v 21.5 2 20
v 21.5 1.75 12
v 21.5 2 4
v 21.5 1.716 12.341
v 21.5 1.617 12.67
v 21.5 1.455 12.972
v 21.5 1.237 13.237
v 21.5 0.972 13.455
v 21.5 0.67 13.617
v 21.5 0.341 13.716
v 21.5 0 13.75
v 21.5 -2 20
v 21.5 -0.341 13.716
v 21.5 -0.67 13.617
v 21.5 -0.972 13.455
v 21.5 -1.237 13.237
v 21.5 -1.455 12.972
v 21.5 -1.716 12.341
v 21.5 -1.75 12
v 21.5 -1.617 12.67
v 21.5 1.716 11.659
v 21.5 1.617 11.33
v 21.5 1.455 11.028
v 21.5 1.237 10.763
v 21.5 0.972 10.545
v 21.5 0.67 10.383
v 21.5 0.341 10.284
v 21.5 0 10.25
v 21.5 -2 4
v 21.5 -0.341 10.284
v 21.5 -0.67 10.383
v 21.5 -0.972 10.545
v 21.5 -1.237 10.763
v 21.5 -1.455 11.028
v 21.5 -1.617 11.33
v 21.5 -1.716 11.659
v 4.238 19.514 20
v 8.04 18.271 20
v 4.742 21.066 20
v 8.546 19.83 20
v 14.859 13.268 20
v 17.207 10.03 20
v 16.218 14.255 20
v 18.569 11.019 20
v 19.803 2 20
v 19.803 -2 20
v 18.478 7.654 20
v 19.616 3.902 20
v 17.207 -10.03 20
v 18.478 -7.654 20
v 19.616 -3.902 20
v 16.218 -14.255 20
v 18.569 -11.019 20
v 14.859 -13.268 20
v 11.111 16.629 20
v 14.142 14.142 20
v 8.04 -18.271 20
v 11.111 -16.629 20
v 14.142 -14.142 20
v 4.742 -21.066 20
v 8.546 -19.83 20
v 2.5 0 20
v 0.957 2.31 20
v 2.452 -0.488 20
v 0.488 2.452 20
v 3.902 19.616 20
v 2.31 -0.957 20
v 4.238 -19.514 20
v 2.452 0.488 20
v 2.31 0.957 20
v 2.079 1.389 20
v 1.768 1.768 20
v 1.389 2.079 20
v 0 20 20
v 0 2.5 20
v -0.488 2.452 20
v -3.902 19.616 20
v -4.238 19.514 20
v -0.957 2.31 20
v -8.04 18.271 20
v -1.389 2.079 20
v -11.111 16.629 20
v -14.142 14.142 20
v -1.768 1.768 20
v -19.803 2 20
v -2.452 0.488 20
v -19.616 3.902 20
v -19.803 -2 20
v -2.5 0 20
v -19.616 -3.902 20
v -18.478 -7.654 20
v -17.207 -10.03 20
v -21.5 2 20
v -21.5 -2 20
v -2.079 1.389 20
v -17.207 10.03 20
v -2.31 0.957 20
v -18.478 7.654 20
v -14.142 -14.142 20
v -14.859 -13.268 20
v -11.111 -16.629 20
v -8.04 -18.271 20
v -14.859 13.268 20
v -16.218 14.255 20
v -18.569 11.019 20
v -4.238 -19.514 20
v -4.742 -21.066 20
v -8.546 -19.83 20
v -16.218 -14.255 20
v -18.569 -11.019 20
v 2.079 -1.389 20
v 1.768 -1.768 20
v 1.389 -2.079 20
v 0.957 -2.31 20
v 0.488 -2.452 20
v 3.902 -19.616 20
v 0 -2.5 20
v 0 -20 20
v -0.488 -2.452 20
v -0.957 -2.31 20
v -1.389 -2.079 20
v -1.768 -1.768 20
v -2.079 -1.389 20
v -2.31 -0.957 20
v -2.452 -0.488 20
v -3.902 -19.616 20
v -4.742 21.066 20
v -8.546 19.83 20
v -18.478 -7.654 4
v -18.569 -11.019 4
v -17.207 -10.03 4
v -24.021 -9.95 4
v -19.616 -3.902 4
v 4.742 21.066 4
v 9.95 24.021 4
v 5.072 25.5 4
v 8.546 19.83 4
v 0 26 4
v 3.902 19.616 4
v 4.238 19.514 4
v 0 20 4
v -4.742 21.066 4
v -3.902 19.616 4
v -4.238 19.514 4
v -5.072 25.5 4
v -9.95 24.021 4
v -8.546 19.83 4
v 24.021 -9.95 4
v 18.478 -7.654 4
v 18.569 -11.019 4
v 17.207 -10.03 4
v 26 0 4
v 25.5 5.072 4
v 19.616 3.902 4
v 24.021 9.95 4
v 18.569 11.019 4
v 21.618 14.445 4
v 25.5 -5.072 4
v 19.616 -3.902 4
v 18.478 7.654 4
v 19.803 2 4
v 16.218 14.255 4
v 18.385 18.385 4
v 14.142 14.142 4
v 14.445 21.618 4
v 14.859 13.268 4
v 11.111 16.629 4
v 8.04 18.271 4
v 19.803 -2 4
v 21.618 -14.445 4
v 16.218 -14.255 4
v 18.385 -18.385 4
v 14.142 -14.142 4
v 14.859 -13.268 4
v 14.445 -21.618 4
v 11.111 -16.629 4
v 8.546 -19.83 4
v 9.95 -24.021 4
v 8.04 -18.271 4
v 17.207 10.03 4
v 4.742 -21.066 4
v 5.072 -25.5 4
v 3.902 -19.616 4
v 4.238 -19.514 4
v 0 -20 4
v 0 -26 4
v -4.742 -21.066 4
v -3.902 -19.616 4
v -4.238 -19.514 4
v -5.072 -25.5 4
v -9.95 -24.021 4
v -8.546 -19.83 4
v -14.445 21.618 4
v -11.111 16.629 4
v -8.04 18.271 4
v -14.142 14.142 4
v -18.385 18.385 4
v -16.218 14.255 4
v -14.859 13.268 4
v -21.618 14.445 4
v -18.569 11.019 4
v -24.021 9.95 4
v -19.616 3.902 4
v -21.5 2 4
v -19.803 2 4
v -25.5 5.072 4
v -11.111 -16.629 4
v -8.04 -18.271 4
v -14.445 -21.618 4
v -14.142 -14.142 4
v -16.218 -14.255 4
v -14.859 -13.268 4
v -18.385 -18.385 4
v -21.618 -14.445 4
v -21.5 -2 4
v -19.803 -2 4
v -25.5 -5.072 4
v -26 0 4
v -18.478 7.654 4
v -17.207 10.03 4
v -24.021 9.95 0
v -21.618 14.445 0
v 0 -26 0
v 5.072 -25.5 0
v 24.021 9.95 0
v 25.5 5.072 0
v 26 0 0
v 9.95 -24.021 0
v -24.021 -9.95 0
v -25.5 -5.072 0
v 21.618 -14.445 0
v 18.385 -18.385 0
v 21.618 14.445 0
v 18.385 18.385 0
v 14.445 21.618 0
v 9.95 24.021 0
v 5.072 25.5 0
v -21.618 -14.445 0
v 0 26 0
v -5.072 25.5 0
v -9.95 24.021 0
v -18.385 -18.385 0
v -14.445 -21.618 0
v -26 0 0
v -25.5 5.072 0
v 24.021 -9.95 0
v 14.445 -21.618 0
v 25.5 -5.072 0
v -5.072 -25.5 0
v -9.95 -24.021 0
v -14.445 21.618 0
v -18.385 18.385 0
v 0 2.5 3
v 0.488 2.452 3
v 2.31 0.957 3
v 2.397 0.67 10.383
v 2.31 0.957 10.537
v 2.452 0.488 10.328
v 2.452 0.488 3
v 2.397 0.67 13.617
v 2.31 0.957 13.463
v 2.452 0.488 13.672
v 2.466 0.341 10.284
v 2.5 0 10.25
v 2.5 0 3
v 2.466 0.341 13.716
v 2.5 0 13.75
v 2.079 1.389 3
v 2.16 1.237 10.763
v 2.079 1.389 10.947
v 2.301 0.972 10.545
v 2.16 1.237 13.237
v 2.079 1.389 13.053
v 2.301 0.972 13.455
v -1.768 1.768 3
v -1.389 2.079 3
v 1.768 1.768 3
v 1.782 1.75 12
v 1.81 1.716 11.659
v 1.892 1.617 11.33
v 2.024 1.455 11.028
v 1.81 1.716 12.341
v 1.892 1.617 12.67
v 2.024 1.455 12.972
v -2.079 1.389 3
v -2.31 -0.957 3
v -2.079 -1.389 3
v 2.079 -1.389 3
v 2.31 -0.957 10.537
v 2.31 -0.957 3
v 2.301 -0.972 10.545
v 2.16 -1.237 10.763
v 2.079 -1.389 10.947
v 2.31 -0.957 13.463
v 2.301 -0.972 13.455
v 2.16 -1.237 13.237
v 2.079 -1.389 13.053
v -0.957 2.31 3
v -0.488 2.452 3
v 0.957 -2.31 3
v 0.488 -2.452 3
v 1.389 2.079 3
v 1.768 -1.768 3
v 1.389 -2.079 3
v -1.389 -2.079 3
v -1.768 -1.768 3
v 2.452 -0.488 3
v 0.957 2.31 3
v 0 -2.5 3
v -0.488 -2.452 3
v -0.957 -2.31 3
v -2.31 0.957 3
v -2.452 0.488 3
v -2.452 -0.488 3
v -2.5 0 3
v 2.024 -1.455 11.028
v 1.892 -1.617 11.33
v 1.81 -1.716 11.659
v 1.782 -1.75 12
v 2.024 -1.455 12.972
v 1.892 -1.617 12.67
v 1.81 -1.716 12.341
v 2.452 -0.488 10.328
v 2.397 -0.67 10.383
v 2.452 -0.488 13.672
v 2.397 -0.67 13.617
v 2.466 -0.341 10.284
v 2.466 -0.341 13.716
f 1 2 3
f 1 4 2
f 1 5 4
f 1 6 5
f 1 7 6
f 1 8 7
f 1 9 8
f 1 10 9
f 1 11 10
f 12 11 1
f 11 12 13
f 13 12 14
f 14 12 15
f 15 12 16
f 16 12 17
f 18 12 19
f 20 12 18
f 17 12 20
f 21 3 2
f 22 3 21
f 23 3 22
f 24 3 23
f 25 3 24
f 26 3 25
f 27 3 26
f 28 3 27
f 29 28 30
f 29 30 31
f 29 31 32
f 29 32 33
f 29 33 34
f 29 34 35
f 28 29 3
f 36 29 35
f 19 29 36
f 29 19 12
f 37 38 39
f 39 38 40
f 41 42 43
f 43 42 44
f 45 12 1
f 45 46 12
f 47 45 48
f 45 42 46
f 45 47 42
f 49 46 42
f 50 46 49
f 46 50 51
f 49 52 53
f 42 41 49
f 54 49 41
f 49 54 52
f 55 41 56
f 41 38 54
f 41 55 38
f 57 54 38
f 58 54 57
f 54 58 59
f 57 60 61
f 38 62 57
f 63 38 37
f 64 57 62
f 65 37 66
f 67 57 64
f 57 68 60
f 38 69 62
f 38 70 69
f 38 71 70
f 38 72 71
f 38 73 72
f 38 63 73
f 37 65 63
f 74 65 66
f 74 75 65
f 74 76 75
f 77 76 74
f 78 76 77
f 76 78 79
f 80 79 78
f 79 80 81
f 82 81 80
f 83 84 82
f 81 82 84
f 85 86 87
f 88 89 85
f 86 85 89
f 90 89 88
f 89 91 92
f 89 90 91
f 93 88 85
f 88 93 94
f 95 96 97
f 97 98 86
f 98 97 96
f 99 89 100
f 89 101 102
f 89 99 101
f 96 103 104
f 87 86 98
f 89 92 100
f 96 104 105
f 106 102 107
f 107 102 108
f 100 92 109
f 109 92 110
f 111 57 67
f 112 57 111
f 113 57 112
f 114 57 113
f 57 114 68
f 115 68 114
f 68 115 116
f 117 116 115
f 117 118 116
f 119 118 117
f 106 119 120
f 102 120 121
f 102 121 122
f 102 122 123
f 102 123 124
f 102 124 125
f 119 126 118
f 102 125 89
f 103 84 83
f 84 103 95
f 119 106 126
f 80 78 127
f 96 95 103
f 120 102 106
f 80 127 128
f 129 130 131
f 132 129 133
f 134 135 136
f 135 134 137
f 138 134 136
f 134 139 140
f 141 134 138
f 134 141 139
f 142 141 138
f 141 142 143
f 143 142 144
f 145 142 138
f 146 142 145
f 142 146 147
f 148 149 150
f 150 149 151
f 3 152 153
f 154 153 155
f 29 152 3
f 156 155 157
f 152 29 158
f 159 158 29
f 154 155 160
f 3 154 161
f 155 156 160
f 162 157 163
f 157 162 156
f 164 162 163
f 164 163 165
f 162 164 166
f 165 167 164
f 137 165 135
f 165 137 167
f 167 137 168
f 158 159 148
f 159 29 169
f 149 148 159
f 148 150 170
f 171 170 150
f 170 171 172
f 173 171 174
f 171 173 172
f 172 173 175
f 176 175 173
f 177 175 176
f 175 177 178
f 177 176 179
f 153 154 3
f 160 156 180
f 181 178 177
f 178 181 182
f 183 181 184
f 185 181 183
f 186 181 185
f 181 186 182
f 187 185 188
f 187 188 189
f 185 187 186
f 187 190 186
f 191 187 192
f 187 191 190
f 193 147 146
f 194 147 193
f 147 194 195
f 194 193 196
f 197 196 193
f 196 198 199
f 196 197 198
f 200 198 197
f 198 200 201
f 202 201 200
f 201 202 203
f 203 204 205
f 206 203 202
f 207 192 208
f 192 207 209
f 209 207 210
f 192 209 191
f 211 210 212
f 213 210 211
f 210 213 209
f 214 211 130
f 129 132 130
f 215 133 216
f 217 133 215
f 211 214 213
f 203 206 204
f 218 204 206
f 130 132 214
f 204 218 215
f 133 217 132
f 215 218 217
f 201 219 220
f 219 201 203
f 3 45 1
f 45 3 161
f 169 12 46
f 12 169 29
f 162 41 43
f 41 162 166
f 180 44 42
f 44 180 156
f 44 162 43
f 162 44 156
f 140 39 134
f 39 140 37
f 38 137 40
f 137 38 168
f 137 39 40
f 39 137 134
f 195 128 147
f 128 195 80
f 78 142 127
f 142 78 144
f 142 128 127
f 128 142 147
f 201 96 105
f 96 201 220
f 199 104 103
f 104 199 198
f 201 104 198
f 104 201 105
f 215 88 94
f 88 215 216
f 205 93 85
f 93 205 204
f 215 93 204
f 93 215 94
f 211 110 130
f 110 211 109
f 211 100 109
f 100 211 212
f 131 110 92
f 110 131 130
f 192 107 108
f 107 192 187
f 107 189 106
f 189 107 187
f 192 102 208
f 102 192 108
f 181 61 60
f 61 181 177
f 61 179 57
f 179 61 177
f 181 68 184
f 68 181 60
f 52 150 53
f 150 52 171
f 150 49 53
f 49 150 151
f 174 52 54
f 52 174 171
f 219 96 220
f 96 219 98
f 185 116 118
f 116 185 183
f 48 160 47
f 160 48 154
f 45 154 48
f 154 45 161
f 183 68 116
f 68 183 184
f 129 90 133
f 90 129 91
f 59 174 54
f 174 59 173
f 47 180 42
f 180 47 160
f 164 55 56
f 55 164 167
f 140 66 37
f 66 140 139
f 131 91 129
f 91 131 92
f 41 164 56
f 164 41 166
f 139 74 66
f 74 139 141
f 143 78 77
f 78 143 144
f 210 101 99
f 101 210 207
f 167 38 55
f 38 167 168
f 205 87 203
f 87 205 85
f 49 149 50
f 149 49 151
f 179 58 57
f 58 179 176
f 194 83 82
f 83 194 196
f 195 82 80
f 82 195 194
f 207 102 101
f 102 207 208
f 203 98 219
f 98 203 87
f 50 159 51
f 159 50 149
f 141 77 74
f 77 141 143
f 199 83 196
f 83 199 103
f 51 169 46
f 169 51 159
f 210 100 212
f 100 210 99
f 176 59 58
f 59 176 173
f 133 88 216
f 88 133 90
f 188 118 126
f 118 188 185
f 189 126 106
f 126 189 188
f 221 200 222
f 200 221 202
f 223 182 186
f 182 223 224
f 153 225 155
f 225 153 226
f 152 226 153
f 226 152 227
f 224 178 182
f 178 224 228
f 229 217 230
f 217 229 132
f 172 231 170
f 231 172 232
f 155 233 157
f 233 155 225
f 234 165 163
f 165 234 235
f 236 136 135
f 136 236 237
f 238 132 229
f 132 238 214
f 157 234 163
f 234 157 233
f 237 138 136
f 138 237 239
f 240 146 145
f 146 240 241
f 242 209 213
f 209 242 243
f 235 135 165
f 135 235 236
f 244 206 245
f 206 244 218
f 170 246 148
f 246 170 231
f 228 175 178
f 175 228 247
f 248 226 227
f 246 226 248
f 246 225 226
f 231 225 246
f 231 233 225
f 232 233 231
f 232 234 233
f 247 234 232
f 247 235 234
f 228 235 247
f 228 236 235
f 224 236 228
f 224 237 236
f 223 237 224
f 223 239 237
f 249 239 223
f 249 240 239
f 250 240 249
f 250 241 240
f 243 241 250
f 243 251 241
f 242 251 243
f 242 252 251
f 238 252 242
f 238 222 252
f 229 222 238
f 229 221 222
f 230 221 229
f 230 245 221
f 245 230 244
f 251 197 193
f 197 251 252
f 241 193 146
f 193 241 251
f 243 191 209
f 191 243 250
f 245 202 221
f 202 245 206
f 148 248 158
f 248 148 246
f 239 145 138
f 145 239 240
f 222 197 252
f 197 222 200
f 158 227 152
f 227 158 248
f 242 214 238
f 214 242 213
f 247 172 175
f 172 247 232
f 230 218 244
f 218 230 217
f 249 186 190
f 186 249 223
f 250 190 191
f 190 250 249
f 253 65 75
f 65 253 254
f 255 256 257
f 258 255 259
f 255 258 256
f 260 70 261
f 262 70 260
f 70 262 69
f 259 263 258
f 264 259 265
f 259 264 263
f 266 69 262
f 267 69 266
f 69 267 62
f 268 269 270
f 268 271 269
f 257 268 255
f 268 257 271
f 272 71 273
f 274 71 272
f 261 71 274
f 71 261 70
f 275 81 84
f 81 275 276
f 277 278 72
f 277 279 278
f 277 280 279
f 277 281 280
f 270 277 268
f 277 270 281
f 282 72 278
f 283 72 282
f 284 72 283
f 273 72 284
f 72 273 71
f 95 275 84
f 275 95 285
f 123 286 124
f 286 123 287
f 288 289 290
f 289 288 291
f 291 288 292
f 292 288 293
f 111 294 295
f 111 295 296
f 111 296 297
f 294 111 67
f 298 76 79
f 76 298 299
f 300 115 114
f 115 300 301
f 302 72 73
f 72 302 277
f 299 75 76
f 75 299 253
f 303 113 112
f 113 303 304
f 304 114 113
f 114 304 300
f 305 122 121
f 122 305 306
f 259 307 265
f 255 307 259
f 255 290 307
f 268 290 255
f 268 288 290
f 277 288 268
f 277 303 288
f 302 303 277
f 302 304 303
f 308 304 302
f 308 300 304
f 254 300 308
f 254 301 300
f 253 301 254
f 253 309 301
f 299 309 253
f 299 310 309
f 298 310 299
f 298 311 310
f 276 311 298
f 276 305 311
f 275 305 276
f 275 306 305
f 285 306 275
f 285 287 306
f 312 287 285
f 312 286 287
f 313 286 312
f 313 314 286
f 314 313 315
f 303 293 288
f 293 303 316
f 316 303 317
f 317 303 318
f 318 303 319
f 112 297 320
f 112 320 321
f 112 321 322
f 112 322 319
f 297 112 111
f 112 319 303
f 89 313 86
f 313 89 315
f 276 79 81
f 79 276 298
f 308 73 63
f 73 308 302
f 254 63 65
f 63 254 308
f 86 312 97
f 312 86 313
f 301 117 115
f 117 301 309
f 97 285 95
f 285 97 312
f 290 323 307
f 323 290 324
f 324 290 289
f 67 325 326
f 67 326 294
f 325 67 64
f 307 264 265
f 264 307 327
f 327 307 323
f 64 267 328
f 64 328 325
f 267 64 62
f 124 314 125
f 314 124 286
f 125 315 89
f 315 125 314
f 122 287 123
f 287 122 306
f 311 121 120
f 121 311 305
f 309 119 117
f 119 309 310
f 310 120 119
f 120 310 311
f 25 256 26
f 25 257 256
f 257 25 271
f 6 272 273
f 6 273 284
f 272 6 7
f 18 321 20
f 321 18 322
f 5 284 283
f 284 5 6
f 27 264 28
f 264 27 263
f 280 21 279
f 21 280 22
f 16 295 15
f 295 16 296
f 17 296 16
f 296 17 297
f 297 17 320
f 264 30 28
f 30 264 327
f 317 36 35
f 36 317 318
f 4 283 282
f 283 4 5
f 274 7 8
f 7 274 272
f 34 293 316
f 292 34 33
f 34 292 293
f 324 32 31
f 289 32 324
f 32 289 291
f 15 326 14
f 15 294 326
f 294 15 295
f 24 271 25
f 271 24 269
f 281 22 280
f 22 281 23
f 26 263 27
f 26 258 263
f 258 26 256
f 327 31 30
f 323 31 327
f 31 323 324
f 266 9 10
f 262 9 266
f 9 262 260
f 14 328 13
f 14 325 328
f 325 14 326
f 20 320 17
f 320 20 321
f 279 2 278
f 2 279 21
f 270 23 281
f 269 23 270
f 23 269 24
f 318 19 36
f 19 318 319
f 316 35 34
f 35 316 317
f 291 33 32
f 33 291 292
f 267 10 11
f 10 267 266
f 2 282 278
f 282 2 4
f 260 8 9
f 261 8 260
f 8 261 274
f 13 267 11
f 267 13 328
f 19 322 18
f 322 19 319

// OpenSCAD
$fn = 32;

// ----------------------------------------------------------------------
// Control knob: skirt knob with grip ribs
// ----------------------------------------------------------------------

// --- parameters (mm) ---
skirt_d = 52;             // skirt diameter
skirt_t = 4;              // skirt thickness
rib_w = 4;                // grip rib width
rib_out = 2.5;            // grip rib radial protrusion
n_ribs = 10;              // number of grip ribs
knob_d = 40;              // knob body diameter
knob_h = 16;              // knob body height
bore_d = 5;               // shaft bore diameter
set_d = 3.5;              // set screw bore diameter
fit_tol = 0.02;           // tolerance for press fits, mm
free_tol = 0.2;           // tolerance for clearance fits, mm

rib_step = 360 / n_ribs;  // rib angular step
total_h = skirt_t + knob_h;  // overall height

difference() {
  union() {
    translate([0, 0, skirt_t]) cylinder(h = knob_h, d = knob_d);
    cylinder(h = skirt_t, d = skirt_d);
    for (i = [0 : n_ribs - 1])
      rotate([0, 0, i * rib_step])
        translate([knob_d / 2 - 1, -rib_w / 2, skirt_t])
          cube([rib_out, rib_w, knob_h]);
  }
  translate([0, 0, skirt_t - 1]) cylinder(h = knob_h + 2, d = bore_d);
  translate([-1, 0, skirt_t + knob_h / 2]) rotate([0, 90, 0])
    cylinder(h = knob_d / 2 + bore_d / 2 + 2, d = set_d);
}
